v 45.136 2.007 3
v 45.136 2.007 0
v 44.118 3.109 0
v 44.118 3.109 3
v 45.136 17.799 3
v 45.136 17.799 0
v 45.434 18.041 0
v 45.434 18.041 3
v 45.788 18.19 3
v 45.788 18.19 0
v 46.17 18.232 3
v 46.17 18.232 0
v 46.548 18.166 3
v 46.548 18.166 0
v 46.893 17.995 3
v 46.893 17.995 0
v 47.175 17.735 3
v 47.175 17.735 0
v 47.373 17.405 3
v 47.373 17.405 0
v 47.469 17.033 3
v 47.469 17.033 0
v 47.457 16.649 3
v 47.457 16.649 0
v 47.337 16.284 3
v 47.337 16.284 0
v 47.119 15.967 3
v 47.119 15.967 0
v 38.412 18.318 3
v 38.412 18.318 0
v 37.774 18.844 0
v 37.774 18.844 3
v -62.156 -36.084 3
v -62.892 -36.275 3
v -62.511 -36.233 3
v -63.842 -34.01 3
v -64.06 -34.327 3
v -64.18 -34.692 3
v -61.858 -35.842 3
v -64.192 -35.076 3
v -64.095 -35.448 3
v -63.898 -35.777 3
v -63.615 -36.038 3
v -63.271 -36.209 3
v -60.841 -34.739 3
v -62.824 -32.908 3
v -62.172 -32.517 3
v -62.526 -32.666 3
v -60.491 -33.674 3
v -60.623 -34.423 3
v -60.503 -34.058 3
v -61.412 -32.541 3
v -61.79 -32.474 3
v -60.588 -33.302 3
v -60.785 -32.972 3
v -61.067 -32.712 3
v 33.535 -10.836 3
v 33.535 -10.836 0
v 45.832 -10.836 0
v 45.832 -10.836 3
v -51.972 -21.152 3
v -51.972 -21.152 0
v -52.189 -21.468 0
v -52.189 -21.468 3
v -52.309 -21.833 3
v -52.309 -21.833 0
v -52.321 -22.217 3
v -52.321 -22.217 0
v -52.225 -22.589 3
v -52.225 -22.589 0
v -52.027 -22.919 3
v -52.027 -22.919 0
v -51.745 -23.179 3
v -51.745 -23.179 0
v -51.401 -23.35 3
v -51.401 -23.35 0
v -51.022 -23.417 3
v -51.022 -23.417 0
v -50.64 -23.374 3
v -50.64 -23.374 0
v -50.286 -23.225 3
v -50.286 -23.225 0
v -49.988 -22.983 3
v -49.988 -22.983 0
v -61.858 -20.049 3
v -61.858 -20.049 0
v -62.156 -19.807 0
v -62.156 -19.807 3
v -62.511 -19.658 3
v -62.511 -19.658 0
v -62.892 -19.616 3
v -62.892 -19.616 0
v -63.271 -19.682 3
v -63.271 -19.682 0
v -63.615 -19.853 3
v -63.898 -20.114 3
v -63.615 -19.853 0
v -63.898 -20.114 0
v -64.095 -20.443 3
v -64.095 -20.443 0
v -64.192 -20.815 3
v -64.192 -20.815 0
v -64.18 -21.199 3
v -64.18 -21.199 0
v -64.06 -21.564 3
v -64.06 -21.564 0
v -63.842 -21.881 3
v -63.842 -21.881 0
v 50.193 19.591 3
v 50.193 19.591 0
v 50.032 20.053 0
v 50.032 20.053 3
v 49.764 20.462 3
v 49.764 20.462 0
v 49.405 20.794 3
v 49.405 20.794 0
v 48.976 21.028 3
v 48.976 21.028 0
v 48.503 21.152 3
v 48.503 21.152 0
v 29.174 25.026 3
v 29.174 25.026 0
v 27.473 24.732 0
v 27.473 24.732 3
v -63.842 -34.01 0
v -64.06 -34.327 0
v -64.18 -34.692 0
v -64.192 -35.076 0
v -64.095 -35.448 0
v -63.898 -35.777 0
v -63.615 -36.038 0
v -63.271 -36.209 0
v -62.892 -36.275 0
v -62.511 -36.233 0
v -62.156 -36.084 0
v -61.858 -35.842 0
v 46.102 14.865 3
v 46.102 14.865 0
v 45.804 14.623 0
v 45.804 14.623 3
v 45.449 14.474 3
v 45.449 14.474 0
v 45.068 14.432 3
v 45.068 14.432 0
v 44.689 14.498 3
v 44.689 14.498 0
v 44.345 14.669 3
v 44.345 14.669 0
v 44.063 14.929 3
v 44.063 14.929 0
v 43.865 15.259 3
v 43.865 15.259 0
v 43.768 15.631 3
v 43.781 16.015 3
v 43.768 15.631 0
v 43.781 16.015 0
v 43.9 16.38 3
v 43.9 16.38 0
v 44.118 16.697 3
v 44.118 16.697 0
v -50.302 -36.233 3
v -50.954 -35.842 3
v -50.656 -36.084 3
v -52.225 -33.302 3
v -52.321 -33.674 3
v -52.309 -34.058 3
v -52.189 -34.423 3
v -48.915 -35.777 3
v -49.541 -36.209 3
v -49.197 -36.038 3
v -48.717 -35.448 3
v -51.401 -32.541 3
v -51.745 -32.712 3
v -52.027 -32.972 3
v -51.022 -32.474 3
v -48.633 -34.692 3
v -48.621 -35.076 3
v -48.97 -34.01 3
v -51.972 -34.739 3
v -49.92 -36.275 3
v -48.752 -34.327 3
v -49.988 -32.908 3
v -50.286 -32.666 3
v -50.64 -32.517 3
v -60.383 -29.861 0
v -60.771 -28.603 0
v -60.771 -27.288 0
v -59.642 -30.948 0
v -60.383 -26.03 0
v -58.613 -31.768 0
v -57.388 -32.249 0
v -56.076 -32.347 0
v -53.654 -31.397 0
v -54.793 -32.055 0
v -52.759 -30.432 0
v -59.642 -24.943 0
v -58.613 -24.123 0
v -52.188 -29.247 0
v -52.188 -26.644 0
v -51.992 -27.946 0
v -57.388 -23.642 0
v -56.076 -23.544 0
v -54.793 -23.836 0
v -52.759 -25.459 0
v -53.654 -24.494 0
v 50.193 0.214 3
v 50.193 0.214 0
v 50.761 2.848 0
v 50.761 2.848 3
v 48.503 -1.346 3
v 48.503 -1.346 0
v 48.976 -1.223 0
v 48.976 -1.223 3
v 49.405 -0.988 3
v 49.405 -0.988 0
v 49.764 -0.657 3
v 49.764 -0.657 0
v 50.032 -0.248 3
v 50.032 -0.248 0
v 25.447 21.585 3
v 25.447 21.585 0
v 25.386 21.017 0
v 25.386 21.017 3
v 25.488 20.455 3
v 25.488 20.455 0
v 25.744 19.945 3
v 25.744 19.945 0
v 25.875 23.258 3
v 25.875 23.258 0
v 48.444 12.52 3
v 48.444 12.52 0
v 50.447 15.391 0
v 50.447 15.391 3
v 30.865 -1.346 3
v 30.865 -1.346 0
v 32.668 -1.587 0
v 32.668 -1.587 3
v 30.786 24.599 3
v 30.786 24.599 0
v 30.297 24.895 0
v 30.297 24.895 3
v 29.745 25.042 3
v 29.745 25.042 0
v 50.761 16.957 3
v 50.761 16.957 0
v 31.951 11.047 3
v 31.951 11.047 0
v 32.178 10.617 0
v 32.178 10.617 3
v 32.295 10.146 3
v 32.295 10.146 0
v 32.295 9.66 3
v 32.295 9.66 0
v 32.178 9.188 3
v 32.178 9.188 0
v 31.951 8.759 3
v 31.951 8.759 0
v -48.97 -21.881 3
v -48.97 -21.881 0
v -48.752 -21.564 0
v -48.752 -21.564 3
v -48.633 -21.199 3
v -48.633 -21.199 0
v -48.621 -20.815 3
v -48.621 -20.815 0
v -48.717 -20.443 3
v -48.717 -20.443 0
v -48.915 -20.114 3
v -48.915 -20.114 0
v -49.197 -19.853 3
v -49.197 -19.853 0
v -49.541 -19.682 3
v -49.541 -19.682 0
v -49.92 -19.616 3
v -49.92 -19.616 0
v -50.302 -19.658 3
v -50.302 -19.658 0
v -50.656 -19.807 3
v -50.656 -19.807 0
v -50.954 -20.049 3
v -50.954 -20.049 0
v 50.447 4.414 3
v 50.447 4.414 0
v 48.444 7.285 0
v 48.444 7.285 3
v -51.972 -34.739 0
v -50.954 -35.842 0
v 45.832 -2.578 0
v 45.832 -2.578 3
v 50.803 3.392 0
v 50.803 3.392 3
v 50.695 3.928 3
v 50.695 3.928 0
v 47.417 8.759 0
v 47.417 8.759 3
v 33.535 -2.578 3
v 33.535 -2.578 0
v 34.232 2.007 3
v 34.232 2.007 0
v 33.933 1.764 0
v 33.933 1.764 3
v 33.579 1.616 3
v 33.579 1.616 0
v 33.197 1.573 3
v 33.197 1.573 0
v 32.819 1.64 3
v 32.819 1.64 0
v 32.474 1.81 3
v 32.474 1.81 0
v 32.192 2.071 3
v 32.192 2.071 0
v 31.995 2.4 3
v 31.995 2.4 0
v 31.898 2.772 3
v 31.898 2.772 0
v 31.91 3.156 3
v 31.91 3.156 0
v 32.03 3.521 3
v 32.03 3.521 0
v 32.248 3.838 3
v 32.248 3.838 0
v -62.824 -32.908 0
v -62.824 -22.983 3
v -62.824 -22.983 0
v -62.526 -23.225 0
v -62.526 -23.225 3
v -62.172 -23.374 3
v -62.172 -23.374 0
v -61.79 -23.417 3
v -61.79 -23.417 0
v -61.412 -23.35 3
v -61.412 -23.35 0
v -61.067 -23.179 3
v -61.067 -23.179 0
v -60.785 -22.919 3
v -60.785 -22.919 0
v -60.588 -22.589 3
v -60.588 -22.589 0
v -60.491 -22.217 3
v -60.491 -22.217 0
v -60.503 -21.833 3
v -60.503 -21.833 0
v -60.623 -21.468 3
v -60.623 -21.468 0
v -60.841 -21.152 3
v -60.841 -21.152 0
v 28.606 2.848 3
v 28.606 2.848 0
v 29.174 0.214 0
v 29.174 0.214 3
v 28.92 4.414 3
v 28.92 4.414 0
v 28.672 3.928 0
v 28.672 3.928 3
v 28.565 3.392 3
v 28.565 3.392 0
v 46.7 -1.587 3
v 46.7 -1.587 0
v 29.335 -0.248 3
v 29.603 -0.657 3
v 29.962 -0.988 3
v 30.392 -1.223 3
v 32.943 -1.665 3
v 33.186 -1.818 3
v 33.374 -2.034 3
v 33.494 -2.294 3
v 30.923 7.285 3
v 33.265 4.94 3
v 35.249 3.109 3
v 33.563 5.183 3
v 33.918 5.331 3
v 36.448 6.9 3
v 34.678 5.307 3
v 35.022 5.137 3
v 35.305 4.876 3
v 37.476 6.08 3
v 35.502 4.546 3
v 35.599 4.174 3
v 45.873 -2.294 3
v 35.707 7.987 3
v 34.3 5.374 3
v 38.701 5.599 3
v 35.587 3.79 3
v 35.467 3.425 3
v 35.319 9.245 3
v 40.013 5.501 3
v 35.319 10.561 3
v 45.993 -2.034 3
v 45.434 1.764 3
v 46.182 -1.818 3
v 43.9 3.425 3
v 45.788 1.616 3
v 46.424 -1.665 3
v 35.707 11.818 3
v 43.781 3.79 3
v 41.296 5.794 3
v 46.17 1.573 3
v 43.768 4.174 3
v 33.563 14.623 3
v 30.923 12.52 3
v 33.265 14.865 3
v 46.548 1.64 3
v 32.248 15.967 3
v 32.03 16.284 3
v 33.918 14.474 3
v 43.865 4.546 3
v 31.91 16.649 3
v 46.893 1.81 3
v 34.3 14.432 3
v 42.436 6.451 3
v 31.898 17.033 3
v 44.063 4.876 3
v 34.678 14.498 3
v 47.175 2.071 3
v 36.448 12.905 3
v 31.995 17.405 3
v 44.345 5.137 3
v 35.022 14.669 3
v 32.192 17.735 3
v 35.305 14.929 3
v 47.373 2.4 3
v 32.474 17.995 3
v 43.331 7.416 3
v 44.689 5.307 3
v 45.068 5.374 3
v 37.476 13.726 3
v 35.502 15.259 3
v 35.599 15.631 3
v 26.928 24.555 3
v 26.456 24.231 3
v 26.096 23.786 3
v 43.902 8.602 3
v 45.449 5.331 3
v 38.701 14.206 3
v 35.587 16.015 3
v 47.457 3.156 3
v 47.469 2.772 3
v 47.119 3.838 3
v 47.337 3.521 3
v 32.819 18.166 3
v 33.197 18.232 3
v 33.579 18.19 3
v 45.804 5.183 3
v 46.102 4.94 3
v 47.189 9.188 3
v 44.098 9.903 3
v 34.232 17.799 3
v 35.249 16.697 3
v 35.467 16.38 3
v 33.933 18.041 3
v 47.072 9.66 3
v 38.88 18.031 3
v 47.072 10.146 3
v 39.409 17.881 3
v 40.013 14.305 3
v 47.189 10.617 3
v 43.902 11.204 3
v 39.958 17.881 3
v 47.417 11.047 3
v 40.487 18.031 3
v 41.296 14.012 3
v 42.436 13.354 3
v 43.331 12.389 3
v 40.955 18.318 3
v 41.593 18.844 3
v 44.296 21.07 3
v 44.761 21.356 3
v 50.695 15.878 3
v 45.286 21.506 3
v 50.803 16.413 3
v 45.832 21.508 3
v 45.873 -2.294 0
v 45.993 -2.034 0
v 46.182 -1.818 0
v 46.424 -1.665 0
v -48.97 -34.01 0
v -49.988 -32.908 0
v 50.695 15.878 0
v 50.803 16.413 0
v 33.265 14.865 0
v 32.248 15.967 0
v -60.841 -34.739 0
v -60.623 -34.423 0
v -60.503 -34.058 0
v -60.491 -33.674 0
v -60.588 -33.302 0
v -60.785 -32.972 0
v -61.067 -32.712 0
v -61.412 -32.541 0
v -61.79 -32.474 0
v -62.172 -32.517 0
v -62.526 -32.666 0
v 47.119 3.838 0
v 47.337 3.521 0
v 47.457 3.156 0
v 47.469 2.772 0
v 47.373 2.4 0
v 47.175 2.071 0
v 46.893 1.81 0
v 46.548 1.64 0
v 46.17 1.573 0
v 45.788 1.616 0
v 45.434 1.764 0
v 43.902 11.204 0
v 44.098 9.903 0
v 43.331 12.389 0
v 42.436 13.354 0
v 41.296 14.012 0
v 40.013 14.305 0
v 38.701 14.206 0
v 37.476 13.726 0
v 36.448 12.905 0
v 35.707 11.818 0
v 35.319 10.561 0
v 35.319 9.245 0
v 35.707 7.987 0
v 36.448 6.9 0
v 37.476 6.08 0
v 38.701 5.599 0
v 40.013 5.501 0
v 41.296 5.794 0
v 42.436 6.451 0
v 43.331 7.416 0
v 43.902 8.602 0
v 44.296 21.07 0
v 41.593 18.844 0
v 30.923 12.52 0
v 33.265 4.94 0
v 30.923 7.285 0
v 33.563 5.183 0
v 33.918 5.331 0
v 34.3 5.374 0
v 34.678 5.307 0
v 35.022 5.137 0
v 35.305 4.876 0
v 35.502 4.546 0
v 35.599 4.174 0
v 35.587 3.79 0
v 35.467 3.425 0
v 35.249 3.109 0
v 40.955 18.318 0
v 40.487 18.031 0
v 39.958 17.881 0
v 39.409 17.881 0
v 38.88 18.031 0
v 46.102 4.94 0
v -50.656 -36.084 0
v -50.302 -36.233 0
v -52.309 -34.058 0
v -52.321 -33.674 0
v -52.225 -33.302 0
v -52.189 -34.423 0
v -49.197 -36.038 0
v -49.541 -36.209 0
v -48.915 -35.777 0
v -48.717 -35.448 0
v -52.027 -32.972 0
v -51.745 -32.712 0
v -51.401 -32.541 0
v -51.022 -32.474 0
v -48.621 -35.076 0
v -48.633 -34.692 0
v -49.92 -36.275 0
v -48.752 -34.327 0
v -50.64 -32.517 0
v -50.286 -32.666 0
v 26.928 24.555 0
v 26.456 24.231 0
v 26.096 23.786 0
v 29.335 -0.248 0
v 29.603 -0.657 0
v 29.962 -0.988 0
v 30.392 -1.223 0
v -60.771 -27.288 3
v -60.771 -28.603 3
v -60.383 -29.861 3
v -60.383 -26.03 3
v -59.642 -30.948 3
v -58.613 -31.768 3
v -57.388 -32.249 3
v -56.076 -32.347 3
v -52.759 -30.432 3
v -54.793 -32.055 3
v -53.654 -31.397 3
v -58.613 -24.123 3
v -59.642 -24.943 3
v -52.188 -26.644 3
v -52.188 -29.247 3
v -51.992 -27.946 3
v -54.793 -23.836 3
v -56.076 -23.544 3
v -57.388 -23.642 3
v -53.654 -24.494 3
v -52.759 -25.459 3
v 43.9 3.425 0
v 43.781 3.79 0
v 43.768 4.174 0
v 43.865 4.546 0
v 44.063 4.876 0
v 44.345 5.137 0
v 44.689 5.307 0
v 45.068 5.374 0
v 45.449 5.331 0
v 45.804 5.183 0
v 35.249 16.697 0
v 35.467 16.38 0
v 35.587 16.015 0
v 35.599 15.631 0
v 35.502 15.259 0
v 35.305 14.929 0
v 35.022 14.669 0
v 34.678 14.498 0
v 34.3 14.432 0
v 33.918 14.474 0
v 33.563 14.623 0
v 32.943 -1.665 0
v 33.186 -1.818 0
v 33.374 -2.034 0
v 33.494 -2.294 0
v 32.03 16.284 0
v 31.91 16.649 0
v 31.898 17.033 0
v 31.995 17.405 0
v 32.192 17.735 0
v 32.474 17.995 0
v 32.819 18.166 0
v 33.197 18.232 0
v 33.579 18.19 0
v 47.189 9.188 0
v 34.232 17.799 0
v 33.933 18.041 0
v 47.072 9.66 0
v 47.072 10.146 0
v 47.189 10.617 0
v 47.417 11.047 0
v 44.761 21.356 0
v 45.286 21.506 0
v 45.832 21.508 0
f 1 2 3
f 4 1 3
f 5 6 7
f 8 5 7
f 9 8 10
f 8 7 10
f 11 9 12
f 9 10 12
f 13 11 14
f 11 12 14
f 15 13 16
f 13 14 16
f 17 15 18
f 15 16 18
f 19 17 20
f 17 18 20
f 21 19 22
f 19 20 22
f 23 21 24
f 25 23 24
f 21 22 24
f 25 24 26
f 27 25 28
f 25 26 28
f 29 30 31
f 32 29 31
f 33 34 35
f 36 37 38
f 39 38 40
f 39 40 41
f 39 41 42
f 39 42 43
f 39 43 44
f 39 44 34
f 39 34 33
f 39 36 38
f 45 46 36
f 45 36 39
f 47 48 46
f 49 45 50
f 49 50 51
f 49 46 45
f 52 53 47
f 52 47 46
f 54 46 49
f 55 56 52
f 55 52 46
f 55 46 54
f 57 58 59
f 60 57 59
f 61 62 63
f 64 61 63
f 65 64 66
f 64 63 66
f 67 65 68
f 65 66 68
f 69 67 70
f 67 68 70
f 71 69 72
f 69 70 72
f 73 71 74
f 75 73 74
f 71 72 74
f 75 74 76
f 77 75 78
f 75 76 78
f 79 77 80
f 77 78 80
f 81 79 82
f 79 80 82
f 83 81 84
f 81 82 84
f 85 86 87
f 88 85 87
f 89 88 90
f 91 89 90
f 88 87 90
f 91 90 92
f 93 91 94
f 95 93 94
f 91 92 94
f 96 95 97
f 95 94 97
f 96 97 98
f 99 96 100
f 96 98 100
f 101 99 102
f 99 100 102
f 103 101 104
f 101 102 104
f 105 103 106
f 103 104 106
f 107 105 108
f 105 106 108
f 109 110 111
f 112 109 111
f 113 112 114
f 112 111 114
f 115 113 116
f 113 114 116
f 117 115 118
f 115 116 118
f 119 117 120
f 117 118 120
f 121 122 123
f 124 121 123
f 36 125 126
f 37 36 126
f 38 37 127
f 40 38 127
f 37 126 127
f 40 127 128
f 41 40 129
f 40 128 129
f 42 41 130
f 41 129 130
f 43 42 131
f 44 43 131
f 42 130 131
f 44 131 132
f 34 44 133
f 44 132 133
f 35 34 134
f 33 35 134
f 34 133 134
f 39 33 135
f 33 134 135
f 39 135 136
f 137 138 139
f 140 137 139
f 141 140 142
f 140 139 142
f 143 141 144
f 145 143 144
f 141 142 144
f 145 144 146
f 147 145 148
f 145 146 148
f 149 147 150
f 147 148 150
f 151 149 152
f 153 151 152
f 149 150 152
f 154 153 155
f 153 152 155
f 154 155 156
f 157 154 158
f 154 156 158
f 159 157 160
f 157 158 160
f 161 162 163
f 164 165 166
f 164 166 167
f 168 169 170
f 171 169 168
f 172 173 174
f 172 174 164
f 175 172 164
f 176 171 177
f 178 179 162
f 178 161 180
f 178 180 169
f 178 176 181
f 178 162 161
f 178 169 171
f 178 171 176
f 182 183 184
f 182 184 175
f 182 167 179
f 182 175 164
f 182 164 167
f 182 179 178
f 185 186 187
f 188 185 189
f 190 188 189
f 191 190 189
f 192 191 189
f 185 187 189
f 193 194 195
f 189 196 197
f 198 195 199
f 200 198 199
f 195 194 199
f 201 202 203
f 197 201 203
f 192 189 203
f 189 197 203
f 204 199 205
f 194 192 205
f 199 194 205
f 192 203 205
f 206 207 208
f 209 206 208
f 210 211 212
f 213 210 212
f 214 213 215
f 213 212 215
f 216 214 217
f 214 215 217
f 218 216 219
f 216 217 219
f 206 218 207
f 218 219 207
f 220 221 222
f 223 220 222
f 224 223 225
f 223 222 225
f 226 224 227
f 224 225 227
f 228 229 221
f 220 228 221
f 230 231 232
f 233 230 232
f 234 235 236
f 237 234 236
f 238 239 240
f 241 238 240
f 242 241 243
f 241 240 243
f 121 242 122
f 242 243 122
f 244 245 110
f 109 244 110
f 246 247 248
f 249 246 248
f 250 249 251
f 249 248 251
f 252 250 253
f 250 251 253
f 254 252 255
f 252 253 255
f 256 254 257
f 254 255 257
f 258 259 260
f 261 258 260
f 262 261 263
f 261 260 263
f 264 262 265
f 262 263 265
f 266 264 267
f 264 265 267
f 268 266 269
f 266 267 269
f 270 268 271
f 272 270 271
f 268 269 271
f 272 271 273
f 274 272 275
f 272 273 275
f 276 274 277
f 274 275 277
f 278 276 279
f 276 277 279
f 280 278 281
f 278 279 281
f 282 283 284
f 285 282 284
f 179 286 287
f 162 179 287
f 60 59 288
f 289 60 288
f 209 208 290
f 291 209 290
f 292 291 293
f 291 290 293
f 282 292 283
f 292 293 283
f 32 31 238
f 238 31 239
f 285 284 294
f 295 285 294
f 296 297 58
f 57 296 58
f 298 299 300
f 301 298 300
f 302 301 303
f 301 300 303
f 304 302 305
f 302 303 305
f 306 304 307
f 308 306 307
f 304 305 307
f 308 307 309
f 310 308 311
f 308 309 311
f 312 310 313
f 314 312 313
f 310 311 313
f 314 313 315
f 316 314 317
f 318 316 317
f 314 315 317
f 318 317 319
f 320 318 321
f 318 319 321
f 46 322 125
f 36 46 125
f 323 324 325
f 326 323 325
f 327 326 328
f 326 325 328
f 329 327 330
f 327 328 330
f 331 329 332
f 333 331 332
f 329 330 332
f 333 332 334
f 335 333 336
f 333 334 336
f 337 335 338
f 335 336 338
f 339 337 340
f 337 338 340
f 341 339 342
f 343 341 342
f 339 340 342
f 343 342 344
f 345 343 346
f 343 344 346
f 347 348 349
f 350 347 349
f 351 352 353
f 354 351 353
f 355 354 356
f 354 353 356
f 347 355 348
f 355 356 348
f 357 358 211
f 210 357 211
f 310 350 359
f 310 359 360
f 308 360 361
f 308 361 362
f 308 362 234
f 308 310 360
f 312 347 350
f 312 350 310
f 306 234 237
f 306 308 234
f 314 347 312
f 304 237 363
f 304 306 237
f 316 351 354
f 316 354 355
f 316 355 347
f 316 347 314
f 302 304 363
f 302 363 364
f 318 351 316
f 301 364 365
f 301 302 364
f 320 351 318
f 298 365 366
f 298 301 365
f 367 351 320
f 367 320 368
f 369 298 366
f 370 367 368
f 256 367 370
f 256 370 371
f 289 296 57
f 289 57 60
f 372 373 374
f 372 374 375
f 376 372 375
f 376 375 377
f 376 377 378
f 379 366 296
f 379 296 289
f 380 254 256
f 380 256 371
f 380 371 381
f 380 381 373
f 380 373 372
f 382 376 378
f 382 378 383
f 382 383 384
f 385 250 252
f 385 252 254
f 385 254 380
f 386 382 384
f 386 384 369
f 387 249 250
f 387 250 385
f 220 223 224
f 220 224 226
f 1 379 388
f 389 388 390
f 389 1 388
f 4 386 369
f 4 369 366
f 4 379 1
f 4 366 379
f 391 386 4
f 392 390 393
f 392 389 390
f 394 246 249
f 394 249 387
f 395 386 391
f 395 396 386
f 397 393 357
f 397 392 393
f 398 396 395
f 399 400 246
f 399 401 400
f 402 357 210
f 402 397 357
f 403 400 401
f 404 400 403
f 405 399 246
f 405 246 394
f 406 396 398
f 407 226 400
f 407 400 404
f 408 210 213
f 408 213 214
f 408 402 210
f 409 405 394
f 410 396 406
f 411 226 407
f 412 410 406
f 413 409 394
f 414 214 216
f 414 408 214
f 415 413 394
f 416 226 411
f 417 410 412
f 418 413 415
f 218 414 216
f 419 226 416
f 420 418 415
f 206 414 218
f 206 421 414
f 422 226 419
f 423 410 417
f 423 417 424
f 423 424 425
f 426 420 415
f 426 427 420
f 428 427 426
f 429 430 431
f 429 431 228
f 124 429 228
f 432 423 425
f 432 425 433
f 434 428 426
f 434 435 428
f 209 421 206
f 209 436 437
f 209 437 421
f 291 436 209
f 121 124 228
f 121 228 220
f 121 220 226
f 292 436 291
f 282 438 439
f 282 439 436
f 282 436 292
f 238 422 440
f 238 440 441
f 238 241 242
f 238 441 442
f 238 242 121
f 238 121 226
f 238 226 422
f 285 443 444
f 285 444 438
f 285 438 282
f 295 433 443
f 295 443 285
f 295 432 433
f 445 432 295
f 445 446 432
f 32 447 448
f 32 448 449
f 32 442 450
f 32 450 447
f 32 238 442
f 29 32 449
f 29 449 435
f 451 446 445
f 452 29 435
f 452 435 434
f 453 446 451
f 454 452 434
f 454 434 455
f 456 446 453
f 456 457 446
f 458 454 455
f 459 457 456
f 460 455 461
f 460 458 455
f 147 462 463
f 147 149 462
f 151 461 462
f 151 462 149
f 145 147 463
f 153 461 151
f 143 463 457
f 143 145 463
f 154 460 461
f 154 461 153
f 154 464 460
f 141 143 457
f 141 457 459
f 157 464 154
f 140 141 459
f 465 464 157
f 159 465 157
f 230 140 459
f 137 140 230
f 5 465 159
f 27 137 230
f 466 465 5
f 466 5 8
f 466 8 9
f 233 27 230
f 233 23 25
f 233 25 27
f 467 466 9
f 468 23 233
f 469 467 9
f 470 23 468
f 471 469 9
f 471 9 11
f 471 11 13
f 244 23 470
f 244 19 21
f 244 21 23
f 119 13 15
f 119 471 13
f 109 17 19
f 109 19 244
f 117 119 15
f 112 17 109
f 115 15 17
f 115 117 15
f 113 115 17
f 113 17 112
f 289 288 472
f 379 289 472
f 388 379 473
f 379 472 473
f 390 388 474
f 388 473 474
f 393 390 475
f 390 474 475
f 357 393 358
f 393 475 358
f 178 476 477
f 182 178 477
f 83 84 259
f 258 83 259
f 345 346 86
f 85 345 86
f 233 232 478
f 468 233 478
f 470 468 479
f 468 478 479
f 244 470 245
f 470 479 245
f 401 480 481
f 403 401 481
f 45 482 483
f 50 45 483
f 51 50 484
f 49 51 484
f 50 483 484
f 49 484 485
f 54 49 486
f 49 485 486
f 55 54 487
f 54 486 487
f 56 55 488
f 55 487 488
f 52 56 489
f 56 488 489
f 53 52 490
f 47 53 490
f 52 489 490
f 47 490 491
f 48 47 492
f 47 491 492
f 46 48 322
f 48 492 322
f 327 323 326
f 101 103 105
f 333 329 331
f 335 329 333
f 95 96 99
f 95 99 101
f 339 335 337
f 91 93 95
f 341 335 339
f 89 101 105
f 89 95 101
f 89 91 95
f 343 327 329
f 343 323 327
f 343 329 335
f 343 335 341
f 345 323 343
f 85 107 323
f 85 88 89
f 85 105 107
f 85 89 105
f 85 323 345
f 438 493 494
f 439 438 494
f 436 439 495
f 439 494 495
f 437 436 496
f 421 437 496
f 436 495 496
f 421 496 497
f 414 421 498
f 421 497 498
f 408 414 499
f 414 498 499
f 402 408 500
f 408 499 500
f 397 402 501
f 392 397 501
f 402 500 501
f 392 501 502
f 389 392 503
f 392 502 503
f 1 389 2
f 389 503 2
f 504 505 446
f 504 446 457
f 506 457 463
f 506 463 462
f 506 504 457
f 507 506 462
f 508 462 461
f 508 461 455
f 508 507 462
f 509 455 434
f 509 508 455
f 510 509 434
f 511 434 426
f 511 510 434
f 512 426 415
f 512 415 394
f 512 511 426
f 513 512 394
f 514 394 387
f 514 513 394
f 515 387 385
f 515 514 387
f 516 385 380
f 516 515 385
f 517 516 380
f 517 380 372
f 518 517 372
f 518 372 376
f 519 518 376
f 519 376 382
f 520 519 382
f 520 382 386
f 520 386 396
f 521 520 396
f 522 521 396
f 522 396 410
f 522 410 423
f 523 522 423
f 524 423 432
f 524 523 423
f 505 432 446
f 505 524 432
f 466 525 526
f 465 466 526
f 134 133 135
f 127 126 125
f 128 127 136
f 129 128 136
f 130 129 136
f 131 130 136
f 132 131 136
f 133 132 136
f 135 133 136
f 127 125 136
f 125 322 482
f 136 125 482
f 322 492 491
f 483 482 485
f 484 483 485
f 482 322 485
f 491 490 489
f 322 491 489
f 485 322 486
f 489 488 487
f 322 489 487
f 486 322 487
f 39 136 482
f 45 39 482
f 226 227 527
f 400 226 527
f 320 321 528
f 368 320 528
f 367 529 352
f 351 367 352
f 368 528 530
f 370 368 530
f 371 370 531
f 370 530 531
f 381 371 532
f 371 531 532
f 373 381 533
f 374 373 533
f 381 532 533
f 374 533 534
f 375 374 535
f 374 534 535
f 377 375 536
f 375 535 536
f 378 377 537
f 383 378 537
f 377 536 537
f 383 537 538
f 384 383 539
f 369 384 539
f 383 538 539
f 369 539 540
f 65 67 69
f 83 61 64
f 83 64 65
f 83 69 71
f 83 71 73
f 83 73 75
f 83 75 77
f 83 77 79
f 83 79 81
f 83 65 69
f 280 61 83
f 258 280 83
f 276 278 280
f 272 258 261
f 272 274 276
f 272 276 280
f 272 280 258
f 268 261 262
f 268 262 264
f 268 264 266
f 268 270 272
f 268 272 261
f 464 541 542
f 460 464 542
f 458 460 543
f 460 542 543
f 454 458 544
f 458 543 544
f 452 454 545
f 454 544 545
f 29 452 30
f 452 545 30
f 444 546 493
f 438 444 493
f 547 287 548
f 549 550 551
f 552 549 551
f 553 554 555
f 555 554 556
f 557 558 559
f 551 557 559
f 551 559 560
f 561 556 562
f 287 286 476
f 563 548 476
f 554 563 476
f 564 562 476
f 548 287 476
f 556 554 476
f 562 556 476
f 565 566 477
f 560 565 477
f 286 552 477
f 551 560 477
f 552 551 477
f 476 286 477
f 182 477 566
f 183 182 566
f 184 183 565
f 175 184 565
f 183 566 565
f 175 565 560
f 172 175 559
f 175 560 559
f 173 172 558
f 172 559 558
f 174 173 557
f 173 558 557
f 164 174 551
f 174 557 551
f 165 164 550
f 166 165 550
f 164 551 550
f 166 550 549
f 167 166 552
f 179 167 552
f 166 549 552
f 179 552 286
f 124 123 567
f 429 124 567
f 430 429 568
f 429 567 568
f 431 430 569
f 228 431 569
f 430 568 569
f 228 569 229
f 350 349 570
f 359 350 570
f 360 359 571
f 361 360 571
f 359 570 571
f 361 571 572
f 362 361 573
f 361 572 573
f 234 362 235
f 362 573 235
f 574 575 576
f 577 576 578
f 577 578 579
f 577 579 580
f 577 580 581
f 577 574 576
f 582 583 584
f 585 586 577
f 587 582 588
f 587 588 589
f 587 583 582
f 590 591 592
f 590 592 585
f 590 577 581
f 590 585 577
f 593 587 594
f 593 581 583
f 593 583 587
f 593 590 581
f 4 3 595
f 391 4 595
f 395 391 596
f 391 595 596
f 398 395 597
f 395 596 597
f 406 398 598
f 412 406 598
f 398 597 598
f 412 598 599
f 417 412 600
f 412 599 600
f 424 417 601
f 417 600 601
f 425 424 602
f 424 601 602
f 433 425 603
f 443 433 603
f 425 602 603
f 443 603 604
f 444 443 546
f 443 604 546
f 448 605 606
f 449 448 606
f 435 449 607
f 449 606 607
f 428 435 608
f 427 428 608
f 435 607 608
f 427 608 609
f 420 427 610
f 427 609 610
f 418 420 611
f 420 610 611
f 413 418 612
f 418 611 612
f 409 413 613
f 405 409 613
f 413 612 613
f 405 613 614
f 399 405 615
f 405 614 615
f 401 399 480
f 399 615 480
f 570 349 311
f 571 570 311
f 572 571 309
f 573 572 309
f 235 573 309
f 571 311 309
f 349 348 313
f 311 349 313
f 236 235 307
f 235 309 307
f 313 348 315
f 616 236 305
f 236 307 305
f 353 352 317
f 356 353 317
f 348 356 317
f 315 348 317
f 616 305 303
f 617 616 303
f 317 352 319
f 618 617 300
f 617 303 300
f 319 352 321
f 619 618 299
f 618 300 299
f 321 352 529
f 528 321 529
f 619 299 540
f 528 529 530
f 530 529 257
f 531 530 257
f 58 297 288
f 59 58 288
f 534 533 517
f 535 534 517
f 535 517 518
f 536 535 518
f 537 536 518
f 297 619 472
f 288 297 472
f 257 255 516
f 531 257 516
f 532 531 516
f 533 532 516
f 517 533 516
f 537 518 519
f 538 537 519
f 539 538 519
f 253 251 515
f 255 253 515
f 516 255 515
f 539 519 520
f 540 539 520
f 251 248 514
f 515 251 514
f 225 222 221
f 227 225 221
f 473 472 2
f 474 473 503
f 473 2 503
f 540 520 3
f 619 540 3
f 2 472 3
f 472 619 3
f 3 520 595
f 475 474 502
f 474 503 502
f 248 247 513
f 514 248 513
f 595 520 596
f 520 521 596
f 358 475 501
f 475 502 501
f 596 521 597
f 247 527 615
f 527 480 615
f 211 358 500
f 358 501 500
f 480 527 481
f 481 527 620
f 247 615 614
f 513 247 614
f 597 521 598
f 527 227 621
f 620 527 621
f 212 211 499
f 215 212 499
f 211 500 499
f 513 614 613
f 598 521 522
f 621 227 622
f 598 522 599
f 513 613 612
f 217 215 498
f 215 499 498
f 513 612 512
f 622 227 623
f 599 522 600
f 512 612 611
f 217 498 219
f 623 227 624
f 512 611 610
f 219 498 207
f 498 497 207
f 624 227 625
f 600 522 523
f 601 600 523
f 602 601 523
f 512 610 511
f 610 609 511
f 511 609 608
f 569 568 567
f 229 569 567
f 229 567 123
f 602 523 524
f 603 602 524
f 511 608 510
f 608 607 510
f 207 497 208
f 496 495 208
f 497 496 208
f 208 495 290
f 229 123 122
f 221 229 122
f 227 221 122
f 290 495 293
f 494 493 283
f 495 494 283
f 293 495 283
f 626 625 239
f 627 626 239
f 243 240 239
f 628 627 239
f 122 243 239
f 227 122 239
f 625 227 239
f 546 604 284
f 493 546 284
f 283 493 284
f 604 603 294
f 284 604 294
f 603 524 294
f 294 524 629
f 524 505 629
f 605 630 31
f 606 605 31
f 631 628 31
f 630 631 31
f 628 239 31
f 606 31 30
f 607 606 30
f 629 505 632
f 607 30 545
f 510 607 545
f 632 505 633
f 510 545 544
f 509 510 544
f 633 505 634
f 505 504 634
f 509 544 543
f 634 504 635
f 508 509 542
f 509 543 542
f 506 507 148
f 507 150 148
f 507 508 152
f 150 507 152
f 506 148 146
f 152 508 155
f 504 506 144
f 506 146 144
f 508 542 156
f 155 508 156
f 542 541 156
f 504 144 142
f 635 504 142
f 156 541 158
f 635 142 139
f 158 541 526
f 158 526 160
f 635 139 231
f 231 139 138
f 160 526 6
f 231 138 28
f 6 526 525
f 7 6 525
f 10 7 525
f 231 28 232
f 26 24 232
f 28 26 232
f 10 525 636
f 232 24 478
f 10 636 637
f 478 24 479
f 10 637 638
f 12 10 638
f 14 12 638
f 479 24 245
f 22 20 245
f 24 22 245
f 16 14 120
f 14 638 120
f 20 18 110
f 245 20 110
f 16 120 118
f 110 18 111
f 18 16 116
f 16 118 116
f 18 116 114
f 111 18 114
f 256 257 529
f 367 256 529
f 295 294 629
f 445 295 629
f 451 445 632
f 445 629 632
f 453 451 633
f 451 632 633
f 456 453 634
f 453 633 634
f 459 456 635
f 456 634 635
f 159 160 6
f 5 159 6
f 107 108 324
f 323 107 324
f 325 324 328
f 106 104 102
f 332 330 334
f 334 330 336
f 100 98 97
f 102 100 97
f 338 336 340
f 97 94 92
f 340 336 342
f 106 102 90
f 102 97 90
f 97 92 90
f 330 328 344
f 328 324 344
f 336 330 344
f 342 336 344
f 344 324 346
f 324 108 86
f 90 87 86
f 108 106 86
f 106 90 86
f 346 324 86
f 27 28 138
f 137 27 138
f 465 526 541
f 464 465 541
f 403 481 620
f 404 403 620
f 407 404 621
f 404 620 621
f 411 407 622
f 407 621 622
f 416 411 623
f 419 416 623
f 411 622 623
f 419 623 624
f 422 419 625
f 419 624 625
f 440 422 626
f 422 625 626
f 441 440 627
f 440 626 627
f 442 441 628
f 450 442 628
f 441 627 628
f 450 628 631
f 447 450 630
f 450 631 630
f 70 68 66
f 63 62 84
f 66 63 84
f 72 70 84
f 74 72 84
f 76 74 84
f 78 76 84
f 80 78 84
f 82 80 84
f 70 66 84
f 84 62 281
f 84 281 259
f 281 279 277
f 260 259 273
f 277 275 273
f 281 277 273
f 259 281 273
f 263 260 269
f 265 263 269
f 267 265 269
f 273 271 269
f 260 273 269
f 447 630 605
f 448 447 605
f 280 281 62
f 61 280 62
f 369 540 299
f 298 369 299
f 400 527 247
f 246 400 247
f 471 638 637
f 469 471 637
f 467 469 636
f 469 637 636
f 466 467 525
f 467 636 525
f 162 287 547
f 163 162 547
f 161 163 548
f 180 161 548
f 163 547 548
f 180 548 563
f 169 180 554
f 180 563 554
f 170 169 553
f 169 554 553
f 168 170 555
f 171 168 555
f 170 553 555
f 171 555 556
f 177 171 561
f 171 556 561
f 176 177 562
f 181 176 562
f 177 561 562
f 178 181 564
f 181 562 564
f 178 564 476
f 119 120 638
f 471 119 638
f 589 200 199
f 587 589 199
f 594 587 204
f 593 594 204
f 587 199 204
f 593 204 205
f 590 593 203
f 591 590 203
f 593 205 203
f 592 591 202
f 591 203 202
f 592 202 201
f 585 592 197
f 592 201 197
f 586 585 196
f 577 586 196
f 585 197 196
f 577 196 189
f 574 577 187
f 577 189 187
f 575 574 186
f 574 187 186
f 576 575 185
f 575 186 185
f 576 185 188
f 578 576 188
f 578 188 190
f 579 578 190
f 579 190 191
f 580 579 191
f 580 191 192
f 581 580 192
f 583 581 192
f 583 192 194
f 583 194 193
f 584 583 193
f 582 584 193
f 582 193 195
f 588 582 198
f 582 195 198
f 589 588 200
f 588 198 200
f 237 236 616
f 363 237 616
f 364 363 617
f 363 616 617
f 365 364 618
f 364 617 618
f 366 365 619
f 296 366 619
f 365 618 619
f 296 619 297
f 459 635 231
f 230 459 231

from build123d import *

# Parameters (mm, degrees)
F0_R     = 4.4142610292
F1_DEPTH = 3


with BuildPart() as f1:
    # F0 (on Top) → F1 (new body)
    with BuildSketch(Plane.XY):
        with BuildLine():
            Line((25.7442902372, 19.9449532418), (30.9231709689, 12.5199109316))
            Line((30.9231709689, 12.5199109316), (31.950624298, 11.0468350227))
            ThreePointArc((31.950624298, 11.0468350227), (32.3102271943, 9.9026771044), (31.950624298, 8.7585191861))
            Line((31.950624298, 8.7585191861), (30.9231709689, 7.2854432773))
            Line((30.9231709689, 7.2854432773), (28.9204229775, 4.4140721562))
            ThreePointArc((28.9204229775, 4.4140721562), (28.5999922268, 3.6638103222), (28.6058278806, 2.8480072634))
            Line((28.6058278806, 2.8480072634), (29.1742312803, 0.2141939336))
            ThreePointArc((29.1742312803, 0.2141939336), (29.7726093608, -0.8334562119), (30.8646685292, -1.3463245451))
            Line((30.8646685292, -1.3463245451), (32.6677180839, -1.5869417583))
            ThreePointArc((32.6677180839, -1.5869417583), (33.2878625229, -1.9194730277), (33.535440608, -2.5781544849))
            Line((33.535440608, -2.5781544849), (33.535440608, -10.8359819278))
            Line((33.535440608, -10.8359819278), (45.8317909572, -10.8359819278))
            Line((45.8317909572, -10.8359819278), (45.8317909572, -2.5781544849))
            ThreePointArc((45.8317909572, -2.5781544849), (46.0793690423, -1.9194730277), (46.6995134813, -1.5869417583))
            Line((46.6995134813, -1.5869417583), (48.502563036, -1.3463245451))
            ThreePointArc((48.502563036, -1.3463245451), (49.5946222044, -0.8334562119), (50.193000285, 0.2141939336))
            Line((50.193000285, 0.2141939336), (50.7614036847, 2.8480072634))
            ThreePointArc((50.7614036847, 2.8480072634), (50.7672393384, 3.6638103222), (50.4468085877, 4.4140721562))
            Line((50.4468085877, 4.4140721562), (48.4440605963, 7.2854432773))
            Line((48.4440605963, 7.2854432773), (47.4166072672, 8.7585191861))
            ThreePointArc((47.4166072672, 8.7585191861), (47.0570043709, 9.9026771044), (47.4166072672, 11.0468350227))
            Line((47.4166072672, 11.0468350227), (48.4440605963, 12.5199109316))
            Line((48.4440605963, 12.5199109316), (50.4468085877, 15.3912820527))
            ThreePointArc((50.4468085877, 15.3912820527), (50.7672393384, 16.1415438867), (50.7614036847, 16.9573469455))
            Line((50.7614036847, 16.9573469455), (50.193000285, 19.5911602753))
            ThreePointArc((50.193000285, 19.5911602753), (49.5946222044, 20.6388104208), (48.502563036, 21.151678754))
            Line((48.502563036, 21.151678754), (45.8317909572, 21.5080936584))
            ThreePointArc((45.8317909572, 21.5080936584), (45.0181238394, 21.4488103812), (44.2958246872, 21.0695313015))
            Line((44.2958246872, 21.0695313015), (41.5934278716, 18.844037405))
            Line((41.5934278716, 18.844037405), (40.9550271008, 18.3182978058))
            ThreePointArc((40.9550271008, 18.3182978058), (39.6836157826, 17.862160902), (38.4122044644, 18.3182978058))
            Line((38.4122044644, 18.3182978058), (37.7738036936, 18.844037405))
            Line((37.7738036936, 18.844037405), (30.7857099055, 24.5989139589))
            ThreePointArc((30.7857099055, 24.5989139589), (30.0266429494, 24.9883131973), (29.1743530908, 25.025948389))
            Line((29.1743530908, 25.025948389), (27.4730209089, 24.7324982196))
            ThreePointArc((27.4730209089, 24.7324982196), (26.4563522851, 24.2311578132), (25.8754814635, 23.2577378718))
            Line((25.8754814635, 23.2577378718), (25.4472023991, 21.5852483387))
            ThreePointArc((25.4472023991, 21.5852483387), (25.4167056377, 20.7326732053), (25.7442902372, 19.9449532418))
        make_face()
        with BuildLine():
            ThreePointArc((33.2652082458, 4.9401631557), (35.1728738329, 5.0163996805), (35.2491103578, 3.1087340934))
            Line((35.2491103578, 3.1087340934), (34.2316497676, 2.0065662534))
            ThreePointArc((34.2316497676, 2.0065662534), (32.3239841805, 1.9303297286), (32.2477476557, 3.8379953157))
            Line((32.2477476557, 3.8379953157), (33.2652082458, 4.9401631557))
        make_face(mode=Mode.SUBTRACT)
        with BuildLine():
            ThreePointArc((44.1181212074, 3.1087340934), (44.1943577323, 5.0163996805), (46.1020233194, 4.9401631557))
            Line((46.1020233194, 4.9401631557), (47.1194839096, 3.8379953157))
            ThreePointArc((47.1194839096, 3.8379953157), (47.0432473847, 1.9303297286), (45.1355817976, 2.0065662534))
            Line((45.1355817976, 2.0065662534), (44.1181212074, 3.1087340934))
        make_face(mode=Mode.SUBTRACT)
        with BuildLine():
            ThreePointArc((35.2491103578, 16.6966201155), (35.1728738329, 14.7889545284), (33.2652082458, 14.8651910532))
            Line((33.2652082458, 14.8651910532), (32.2477476557, 15.9673588932))
            ThreePointArc((32.2477476557, 15.9673588932), (32.3239841805, 17.8750244803), (34.2316497676, 17.7987879555))
            Line((34.2316497676, 17.7987879555), (35.2491103578, 16.6966201155))
        make_face(mode=Mode.SUBTRACT)
        with Locations((39.6836157826, 9.9026771044)):
            Circle(F0_R, mode=Mode.SUBTRACT)
        with BuildLine():
            Line((47.1194839096, 15.9673588932), (46.1020233194, 14.8651910532))
            ThreePointArc((46.1020233194, 14.8651910532), (44.1943577323, 14.7889545284), (44.1181212074, 16.6966201155))
            Line((44.1181212074, 16.6966201155), (45.1355817976, 17.7987879555))
            ThreePointArc((45.1355817976, 17.7987879555), (47.0432473847, 17.8750244803), (47.1194839096, 15.9673588932))
        make_face(mode=Mode.SUBTRACT)
    extrude(amount=F1_DEPTH)


with BuildPart() as f1b:
    # F0 (on Top) → F1, piece 2 (new body)
    with BuildSketch(Plane.XY):
        with BuildLine():
            Line((-63.8419478975, -21.8808193593), (-62.8244873074, -22.9829871993))
            ThreePointArc((-62.8244873074, -22.9829871993), (-60.9168217203, -23.0592237242), (-60.8405851954, -21.1515581371))
            Line((-60.8405851954, -21.1515581371), (-61.8580457856, -20.0493902971))
            ThreePointArc((-61.8580457856, -20.0493902971), (-63.7657113727, -19.9731537722), (-63.8419478975, -21.8808193593))
        make_face()
    extrude(amount=F1_DEPTH)


with BuildPart() as f1c:
    # F0 (on Top) → F1, piece 3 (new body)
    with BuildSketch(Plane.XY):
        with Locations((-56.4060797706, -27.9455011481)):
            Circle(F0_R)
    extrude(amount=F1_DEPTH)


with BuildPart() as f1d:
    # F0 (on Top) → F1, piece 4 (new body)
    with BuildSketch(Plane.XY):
        with BuildLine():
            ThreePointArc((-51.9715743458, -21.1515581371), (-51.8953378209, -23.0592237242), (-49.9876722338, -22.9829871993))
            Line((-49.9876722338, -22.9829871993), (-48.9702116437, -21.8808193593))
            ThreePointArc((-48.9702116437, -21.8808193593), (-49.0464481685, -19.9731537722), (-50.9541137556, -20.0493902971))
            Line((-50.9541137556, -20.0493902971), (-51.9715743458, -21.1515581371))
        make_face()
    extrude(amount=F1_DEPTH)


with BuildPart() as f1e:
    # F0 (on Top) → F1, piece 5 (new body)
    with BuildSketch(Plane.XY):
        with BuildLine():
            Line((-48.9702116437, -34.0101829368), (-49.9876722338, -32.9080150968))
            ThreePointArc((-49.9876722338, -32.9080150968), (-51.8953378209, -32.831778572), (-51.9715743458, -34.7394441591))
            Line((-51.9715743458, -34.7394441591), (-50.9541137556, -35.8416119991))
            ThreePointArc((-50.9541137556, -35.8416119991), (-49.0464481685, -35.9178485239), (-48.9702116437, -34.0101829368))
        make_face()
    extrude(amount=F1_DEPTH)


with BuildPart() as f1f:
    # F0 (on Top) → F1, piece 6 (new body)
    with BuildSketch(Plane.XY):
        with BuildLine():
            Line((-61.8580457856, -35.8416119991), (-60.8405851954, -34.7394441591))
            ThreePointArc((-60.8405851954, -34.7394441591), (-60.9168217203, -32.831778572), (-62.8244873074, -32.9080150968))
            Line((-62.8244873074, -32.9080150968), (-63.8419478975, -34.0101829368))
            ThreePointArc((-63.8419478975, -34.0101829368), (-63.7657113727, -35.9178485239), (-61.8580457856, -35.8416119991))
        make_face()
    extrude(amount=F1_DEPTH)


solid = Compound([f1.part, f1b.part, f1c.part, f1d.part, f1e.part, f1f.part])
